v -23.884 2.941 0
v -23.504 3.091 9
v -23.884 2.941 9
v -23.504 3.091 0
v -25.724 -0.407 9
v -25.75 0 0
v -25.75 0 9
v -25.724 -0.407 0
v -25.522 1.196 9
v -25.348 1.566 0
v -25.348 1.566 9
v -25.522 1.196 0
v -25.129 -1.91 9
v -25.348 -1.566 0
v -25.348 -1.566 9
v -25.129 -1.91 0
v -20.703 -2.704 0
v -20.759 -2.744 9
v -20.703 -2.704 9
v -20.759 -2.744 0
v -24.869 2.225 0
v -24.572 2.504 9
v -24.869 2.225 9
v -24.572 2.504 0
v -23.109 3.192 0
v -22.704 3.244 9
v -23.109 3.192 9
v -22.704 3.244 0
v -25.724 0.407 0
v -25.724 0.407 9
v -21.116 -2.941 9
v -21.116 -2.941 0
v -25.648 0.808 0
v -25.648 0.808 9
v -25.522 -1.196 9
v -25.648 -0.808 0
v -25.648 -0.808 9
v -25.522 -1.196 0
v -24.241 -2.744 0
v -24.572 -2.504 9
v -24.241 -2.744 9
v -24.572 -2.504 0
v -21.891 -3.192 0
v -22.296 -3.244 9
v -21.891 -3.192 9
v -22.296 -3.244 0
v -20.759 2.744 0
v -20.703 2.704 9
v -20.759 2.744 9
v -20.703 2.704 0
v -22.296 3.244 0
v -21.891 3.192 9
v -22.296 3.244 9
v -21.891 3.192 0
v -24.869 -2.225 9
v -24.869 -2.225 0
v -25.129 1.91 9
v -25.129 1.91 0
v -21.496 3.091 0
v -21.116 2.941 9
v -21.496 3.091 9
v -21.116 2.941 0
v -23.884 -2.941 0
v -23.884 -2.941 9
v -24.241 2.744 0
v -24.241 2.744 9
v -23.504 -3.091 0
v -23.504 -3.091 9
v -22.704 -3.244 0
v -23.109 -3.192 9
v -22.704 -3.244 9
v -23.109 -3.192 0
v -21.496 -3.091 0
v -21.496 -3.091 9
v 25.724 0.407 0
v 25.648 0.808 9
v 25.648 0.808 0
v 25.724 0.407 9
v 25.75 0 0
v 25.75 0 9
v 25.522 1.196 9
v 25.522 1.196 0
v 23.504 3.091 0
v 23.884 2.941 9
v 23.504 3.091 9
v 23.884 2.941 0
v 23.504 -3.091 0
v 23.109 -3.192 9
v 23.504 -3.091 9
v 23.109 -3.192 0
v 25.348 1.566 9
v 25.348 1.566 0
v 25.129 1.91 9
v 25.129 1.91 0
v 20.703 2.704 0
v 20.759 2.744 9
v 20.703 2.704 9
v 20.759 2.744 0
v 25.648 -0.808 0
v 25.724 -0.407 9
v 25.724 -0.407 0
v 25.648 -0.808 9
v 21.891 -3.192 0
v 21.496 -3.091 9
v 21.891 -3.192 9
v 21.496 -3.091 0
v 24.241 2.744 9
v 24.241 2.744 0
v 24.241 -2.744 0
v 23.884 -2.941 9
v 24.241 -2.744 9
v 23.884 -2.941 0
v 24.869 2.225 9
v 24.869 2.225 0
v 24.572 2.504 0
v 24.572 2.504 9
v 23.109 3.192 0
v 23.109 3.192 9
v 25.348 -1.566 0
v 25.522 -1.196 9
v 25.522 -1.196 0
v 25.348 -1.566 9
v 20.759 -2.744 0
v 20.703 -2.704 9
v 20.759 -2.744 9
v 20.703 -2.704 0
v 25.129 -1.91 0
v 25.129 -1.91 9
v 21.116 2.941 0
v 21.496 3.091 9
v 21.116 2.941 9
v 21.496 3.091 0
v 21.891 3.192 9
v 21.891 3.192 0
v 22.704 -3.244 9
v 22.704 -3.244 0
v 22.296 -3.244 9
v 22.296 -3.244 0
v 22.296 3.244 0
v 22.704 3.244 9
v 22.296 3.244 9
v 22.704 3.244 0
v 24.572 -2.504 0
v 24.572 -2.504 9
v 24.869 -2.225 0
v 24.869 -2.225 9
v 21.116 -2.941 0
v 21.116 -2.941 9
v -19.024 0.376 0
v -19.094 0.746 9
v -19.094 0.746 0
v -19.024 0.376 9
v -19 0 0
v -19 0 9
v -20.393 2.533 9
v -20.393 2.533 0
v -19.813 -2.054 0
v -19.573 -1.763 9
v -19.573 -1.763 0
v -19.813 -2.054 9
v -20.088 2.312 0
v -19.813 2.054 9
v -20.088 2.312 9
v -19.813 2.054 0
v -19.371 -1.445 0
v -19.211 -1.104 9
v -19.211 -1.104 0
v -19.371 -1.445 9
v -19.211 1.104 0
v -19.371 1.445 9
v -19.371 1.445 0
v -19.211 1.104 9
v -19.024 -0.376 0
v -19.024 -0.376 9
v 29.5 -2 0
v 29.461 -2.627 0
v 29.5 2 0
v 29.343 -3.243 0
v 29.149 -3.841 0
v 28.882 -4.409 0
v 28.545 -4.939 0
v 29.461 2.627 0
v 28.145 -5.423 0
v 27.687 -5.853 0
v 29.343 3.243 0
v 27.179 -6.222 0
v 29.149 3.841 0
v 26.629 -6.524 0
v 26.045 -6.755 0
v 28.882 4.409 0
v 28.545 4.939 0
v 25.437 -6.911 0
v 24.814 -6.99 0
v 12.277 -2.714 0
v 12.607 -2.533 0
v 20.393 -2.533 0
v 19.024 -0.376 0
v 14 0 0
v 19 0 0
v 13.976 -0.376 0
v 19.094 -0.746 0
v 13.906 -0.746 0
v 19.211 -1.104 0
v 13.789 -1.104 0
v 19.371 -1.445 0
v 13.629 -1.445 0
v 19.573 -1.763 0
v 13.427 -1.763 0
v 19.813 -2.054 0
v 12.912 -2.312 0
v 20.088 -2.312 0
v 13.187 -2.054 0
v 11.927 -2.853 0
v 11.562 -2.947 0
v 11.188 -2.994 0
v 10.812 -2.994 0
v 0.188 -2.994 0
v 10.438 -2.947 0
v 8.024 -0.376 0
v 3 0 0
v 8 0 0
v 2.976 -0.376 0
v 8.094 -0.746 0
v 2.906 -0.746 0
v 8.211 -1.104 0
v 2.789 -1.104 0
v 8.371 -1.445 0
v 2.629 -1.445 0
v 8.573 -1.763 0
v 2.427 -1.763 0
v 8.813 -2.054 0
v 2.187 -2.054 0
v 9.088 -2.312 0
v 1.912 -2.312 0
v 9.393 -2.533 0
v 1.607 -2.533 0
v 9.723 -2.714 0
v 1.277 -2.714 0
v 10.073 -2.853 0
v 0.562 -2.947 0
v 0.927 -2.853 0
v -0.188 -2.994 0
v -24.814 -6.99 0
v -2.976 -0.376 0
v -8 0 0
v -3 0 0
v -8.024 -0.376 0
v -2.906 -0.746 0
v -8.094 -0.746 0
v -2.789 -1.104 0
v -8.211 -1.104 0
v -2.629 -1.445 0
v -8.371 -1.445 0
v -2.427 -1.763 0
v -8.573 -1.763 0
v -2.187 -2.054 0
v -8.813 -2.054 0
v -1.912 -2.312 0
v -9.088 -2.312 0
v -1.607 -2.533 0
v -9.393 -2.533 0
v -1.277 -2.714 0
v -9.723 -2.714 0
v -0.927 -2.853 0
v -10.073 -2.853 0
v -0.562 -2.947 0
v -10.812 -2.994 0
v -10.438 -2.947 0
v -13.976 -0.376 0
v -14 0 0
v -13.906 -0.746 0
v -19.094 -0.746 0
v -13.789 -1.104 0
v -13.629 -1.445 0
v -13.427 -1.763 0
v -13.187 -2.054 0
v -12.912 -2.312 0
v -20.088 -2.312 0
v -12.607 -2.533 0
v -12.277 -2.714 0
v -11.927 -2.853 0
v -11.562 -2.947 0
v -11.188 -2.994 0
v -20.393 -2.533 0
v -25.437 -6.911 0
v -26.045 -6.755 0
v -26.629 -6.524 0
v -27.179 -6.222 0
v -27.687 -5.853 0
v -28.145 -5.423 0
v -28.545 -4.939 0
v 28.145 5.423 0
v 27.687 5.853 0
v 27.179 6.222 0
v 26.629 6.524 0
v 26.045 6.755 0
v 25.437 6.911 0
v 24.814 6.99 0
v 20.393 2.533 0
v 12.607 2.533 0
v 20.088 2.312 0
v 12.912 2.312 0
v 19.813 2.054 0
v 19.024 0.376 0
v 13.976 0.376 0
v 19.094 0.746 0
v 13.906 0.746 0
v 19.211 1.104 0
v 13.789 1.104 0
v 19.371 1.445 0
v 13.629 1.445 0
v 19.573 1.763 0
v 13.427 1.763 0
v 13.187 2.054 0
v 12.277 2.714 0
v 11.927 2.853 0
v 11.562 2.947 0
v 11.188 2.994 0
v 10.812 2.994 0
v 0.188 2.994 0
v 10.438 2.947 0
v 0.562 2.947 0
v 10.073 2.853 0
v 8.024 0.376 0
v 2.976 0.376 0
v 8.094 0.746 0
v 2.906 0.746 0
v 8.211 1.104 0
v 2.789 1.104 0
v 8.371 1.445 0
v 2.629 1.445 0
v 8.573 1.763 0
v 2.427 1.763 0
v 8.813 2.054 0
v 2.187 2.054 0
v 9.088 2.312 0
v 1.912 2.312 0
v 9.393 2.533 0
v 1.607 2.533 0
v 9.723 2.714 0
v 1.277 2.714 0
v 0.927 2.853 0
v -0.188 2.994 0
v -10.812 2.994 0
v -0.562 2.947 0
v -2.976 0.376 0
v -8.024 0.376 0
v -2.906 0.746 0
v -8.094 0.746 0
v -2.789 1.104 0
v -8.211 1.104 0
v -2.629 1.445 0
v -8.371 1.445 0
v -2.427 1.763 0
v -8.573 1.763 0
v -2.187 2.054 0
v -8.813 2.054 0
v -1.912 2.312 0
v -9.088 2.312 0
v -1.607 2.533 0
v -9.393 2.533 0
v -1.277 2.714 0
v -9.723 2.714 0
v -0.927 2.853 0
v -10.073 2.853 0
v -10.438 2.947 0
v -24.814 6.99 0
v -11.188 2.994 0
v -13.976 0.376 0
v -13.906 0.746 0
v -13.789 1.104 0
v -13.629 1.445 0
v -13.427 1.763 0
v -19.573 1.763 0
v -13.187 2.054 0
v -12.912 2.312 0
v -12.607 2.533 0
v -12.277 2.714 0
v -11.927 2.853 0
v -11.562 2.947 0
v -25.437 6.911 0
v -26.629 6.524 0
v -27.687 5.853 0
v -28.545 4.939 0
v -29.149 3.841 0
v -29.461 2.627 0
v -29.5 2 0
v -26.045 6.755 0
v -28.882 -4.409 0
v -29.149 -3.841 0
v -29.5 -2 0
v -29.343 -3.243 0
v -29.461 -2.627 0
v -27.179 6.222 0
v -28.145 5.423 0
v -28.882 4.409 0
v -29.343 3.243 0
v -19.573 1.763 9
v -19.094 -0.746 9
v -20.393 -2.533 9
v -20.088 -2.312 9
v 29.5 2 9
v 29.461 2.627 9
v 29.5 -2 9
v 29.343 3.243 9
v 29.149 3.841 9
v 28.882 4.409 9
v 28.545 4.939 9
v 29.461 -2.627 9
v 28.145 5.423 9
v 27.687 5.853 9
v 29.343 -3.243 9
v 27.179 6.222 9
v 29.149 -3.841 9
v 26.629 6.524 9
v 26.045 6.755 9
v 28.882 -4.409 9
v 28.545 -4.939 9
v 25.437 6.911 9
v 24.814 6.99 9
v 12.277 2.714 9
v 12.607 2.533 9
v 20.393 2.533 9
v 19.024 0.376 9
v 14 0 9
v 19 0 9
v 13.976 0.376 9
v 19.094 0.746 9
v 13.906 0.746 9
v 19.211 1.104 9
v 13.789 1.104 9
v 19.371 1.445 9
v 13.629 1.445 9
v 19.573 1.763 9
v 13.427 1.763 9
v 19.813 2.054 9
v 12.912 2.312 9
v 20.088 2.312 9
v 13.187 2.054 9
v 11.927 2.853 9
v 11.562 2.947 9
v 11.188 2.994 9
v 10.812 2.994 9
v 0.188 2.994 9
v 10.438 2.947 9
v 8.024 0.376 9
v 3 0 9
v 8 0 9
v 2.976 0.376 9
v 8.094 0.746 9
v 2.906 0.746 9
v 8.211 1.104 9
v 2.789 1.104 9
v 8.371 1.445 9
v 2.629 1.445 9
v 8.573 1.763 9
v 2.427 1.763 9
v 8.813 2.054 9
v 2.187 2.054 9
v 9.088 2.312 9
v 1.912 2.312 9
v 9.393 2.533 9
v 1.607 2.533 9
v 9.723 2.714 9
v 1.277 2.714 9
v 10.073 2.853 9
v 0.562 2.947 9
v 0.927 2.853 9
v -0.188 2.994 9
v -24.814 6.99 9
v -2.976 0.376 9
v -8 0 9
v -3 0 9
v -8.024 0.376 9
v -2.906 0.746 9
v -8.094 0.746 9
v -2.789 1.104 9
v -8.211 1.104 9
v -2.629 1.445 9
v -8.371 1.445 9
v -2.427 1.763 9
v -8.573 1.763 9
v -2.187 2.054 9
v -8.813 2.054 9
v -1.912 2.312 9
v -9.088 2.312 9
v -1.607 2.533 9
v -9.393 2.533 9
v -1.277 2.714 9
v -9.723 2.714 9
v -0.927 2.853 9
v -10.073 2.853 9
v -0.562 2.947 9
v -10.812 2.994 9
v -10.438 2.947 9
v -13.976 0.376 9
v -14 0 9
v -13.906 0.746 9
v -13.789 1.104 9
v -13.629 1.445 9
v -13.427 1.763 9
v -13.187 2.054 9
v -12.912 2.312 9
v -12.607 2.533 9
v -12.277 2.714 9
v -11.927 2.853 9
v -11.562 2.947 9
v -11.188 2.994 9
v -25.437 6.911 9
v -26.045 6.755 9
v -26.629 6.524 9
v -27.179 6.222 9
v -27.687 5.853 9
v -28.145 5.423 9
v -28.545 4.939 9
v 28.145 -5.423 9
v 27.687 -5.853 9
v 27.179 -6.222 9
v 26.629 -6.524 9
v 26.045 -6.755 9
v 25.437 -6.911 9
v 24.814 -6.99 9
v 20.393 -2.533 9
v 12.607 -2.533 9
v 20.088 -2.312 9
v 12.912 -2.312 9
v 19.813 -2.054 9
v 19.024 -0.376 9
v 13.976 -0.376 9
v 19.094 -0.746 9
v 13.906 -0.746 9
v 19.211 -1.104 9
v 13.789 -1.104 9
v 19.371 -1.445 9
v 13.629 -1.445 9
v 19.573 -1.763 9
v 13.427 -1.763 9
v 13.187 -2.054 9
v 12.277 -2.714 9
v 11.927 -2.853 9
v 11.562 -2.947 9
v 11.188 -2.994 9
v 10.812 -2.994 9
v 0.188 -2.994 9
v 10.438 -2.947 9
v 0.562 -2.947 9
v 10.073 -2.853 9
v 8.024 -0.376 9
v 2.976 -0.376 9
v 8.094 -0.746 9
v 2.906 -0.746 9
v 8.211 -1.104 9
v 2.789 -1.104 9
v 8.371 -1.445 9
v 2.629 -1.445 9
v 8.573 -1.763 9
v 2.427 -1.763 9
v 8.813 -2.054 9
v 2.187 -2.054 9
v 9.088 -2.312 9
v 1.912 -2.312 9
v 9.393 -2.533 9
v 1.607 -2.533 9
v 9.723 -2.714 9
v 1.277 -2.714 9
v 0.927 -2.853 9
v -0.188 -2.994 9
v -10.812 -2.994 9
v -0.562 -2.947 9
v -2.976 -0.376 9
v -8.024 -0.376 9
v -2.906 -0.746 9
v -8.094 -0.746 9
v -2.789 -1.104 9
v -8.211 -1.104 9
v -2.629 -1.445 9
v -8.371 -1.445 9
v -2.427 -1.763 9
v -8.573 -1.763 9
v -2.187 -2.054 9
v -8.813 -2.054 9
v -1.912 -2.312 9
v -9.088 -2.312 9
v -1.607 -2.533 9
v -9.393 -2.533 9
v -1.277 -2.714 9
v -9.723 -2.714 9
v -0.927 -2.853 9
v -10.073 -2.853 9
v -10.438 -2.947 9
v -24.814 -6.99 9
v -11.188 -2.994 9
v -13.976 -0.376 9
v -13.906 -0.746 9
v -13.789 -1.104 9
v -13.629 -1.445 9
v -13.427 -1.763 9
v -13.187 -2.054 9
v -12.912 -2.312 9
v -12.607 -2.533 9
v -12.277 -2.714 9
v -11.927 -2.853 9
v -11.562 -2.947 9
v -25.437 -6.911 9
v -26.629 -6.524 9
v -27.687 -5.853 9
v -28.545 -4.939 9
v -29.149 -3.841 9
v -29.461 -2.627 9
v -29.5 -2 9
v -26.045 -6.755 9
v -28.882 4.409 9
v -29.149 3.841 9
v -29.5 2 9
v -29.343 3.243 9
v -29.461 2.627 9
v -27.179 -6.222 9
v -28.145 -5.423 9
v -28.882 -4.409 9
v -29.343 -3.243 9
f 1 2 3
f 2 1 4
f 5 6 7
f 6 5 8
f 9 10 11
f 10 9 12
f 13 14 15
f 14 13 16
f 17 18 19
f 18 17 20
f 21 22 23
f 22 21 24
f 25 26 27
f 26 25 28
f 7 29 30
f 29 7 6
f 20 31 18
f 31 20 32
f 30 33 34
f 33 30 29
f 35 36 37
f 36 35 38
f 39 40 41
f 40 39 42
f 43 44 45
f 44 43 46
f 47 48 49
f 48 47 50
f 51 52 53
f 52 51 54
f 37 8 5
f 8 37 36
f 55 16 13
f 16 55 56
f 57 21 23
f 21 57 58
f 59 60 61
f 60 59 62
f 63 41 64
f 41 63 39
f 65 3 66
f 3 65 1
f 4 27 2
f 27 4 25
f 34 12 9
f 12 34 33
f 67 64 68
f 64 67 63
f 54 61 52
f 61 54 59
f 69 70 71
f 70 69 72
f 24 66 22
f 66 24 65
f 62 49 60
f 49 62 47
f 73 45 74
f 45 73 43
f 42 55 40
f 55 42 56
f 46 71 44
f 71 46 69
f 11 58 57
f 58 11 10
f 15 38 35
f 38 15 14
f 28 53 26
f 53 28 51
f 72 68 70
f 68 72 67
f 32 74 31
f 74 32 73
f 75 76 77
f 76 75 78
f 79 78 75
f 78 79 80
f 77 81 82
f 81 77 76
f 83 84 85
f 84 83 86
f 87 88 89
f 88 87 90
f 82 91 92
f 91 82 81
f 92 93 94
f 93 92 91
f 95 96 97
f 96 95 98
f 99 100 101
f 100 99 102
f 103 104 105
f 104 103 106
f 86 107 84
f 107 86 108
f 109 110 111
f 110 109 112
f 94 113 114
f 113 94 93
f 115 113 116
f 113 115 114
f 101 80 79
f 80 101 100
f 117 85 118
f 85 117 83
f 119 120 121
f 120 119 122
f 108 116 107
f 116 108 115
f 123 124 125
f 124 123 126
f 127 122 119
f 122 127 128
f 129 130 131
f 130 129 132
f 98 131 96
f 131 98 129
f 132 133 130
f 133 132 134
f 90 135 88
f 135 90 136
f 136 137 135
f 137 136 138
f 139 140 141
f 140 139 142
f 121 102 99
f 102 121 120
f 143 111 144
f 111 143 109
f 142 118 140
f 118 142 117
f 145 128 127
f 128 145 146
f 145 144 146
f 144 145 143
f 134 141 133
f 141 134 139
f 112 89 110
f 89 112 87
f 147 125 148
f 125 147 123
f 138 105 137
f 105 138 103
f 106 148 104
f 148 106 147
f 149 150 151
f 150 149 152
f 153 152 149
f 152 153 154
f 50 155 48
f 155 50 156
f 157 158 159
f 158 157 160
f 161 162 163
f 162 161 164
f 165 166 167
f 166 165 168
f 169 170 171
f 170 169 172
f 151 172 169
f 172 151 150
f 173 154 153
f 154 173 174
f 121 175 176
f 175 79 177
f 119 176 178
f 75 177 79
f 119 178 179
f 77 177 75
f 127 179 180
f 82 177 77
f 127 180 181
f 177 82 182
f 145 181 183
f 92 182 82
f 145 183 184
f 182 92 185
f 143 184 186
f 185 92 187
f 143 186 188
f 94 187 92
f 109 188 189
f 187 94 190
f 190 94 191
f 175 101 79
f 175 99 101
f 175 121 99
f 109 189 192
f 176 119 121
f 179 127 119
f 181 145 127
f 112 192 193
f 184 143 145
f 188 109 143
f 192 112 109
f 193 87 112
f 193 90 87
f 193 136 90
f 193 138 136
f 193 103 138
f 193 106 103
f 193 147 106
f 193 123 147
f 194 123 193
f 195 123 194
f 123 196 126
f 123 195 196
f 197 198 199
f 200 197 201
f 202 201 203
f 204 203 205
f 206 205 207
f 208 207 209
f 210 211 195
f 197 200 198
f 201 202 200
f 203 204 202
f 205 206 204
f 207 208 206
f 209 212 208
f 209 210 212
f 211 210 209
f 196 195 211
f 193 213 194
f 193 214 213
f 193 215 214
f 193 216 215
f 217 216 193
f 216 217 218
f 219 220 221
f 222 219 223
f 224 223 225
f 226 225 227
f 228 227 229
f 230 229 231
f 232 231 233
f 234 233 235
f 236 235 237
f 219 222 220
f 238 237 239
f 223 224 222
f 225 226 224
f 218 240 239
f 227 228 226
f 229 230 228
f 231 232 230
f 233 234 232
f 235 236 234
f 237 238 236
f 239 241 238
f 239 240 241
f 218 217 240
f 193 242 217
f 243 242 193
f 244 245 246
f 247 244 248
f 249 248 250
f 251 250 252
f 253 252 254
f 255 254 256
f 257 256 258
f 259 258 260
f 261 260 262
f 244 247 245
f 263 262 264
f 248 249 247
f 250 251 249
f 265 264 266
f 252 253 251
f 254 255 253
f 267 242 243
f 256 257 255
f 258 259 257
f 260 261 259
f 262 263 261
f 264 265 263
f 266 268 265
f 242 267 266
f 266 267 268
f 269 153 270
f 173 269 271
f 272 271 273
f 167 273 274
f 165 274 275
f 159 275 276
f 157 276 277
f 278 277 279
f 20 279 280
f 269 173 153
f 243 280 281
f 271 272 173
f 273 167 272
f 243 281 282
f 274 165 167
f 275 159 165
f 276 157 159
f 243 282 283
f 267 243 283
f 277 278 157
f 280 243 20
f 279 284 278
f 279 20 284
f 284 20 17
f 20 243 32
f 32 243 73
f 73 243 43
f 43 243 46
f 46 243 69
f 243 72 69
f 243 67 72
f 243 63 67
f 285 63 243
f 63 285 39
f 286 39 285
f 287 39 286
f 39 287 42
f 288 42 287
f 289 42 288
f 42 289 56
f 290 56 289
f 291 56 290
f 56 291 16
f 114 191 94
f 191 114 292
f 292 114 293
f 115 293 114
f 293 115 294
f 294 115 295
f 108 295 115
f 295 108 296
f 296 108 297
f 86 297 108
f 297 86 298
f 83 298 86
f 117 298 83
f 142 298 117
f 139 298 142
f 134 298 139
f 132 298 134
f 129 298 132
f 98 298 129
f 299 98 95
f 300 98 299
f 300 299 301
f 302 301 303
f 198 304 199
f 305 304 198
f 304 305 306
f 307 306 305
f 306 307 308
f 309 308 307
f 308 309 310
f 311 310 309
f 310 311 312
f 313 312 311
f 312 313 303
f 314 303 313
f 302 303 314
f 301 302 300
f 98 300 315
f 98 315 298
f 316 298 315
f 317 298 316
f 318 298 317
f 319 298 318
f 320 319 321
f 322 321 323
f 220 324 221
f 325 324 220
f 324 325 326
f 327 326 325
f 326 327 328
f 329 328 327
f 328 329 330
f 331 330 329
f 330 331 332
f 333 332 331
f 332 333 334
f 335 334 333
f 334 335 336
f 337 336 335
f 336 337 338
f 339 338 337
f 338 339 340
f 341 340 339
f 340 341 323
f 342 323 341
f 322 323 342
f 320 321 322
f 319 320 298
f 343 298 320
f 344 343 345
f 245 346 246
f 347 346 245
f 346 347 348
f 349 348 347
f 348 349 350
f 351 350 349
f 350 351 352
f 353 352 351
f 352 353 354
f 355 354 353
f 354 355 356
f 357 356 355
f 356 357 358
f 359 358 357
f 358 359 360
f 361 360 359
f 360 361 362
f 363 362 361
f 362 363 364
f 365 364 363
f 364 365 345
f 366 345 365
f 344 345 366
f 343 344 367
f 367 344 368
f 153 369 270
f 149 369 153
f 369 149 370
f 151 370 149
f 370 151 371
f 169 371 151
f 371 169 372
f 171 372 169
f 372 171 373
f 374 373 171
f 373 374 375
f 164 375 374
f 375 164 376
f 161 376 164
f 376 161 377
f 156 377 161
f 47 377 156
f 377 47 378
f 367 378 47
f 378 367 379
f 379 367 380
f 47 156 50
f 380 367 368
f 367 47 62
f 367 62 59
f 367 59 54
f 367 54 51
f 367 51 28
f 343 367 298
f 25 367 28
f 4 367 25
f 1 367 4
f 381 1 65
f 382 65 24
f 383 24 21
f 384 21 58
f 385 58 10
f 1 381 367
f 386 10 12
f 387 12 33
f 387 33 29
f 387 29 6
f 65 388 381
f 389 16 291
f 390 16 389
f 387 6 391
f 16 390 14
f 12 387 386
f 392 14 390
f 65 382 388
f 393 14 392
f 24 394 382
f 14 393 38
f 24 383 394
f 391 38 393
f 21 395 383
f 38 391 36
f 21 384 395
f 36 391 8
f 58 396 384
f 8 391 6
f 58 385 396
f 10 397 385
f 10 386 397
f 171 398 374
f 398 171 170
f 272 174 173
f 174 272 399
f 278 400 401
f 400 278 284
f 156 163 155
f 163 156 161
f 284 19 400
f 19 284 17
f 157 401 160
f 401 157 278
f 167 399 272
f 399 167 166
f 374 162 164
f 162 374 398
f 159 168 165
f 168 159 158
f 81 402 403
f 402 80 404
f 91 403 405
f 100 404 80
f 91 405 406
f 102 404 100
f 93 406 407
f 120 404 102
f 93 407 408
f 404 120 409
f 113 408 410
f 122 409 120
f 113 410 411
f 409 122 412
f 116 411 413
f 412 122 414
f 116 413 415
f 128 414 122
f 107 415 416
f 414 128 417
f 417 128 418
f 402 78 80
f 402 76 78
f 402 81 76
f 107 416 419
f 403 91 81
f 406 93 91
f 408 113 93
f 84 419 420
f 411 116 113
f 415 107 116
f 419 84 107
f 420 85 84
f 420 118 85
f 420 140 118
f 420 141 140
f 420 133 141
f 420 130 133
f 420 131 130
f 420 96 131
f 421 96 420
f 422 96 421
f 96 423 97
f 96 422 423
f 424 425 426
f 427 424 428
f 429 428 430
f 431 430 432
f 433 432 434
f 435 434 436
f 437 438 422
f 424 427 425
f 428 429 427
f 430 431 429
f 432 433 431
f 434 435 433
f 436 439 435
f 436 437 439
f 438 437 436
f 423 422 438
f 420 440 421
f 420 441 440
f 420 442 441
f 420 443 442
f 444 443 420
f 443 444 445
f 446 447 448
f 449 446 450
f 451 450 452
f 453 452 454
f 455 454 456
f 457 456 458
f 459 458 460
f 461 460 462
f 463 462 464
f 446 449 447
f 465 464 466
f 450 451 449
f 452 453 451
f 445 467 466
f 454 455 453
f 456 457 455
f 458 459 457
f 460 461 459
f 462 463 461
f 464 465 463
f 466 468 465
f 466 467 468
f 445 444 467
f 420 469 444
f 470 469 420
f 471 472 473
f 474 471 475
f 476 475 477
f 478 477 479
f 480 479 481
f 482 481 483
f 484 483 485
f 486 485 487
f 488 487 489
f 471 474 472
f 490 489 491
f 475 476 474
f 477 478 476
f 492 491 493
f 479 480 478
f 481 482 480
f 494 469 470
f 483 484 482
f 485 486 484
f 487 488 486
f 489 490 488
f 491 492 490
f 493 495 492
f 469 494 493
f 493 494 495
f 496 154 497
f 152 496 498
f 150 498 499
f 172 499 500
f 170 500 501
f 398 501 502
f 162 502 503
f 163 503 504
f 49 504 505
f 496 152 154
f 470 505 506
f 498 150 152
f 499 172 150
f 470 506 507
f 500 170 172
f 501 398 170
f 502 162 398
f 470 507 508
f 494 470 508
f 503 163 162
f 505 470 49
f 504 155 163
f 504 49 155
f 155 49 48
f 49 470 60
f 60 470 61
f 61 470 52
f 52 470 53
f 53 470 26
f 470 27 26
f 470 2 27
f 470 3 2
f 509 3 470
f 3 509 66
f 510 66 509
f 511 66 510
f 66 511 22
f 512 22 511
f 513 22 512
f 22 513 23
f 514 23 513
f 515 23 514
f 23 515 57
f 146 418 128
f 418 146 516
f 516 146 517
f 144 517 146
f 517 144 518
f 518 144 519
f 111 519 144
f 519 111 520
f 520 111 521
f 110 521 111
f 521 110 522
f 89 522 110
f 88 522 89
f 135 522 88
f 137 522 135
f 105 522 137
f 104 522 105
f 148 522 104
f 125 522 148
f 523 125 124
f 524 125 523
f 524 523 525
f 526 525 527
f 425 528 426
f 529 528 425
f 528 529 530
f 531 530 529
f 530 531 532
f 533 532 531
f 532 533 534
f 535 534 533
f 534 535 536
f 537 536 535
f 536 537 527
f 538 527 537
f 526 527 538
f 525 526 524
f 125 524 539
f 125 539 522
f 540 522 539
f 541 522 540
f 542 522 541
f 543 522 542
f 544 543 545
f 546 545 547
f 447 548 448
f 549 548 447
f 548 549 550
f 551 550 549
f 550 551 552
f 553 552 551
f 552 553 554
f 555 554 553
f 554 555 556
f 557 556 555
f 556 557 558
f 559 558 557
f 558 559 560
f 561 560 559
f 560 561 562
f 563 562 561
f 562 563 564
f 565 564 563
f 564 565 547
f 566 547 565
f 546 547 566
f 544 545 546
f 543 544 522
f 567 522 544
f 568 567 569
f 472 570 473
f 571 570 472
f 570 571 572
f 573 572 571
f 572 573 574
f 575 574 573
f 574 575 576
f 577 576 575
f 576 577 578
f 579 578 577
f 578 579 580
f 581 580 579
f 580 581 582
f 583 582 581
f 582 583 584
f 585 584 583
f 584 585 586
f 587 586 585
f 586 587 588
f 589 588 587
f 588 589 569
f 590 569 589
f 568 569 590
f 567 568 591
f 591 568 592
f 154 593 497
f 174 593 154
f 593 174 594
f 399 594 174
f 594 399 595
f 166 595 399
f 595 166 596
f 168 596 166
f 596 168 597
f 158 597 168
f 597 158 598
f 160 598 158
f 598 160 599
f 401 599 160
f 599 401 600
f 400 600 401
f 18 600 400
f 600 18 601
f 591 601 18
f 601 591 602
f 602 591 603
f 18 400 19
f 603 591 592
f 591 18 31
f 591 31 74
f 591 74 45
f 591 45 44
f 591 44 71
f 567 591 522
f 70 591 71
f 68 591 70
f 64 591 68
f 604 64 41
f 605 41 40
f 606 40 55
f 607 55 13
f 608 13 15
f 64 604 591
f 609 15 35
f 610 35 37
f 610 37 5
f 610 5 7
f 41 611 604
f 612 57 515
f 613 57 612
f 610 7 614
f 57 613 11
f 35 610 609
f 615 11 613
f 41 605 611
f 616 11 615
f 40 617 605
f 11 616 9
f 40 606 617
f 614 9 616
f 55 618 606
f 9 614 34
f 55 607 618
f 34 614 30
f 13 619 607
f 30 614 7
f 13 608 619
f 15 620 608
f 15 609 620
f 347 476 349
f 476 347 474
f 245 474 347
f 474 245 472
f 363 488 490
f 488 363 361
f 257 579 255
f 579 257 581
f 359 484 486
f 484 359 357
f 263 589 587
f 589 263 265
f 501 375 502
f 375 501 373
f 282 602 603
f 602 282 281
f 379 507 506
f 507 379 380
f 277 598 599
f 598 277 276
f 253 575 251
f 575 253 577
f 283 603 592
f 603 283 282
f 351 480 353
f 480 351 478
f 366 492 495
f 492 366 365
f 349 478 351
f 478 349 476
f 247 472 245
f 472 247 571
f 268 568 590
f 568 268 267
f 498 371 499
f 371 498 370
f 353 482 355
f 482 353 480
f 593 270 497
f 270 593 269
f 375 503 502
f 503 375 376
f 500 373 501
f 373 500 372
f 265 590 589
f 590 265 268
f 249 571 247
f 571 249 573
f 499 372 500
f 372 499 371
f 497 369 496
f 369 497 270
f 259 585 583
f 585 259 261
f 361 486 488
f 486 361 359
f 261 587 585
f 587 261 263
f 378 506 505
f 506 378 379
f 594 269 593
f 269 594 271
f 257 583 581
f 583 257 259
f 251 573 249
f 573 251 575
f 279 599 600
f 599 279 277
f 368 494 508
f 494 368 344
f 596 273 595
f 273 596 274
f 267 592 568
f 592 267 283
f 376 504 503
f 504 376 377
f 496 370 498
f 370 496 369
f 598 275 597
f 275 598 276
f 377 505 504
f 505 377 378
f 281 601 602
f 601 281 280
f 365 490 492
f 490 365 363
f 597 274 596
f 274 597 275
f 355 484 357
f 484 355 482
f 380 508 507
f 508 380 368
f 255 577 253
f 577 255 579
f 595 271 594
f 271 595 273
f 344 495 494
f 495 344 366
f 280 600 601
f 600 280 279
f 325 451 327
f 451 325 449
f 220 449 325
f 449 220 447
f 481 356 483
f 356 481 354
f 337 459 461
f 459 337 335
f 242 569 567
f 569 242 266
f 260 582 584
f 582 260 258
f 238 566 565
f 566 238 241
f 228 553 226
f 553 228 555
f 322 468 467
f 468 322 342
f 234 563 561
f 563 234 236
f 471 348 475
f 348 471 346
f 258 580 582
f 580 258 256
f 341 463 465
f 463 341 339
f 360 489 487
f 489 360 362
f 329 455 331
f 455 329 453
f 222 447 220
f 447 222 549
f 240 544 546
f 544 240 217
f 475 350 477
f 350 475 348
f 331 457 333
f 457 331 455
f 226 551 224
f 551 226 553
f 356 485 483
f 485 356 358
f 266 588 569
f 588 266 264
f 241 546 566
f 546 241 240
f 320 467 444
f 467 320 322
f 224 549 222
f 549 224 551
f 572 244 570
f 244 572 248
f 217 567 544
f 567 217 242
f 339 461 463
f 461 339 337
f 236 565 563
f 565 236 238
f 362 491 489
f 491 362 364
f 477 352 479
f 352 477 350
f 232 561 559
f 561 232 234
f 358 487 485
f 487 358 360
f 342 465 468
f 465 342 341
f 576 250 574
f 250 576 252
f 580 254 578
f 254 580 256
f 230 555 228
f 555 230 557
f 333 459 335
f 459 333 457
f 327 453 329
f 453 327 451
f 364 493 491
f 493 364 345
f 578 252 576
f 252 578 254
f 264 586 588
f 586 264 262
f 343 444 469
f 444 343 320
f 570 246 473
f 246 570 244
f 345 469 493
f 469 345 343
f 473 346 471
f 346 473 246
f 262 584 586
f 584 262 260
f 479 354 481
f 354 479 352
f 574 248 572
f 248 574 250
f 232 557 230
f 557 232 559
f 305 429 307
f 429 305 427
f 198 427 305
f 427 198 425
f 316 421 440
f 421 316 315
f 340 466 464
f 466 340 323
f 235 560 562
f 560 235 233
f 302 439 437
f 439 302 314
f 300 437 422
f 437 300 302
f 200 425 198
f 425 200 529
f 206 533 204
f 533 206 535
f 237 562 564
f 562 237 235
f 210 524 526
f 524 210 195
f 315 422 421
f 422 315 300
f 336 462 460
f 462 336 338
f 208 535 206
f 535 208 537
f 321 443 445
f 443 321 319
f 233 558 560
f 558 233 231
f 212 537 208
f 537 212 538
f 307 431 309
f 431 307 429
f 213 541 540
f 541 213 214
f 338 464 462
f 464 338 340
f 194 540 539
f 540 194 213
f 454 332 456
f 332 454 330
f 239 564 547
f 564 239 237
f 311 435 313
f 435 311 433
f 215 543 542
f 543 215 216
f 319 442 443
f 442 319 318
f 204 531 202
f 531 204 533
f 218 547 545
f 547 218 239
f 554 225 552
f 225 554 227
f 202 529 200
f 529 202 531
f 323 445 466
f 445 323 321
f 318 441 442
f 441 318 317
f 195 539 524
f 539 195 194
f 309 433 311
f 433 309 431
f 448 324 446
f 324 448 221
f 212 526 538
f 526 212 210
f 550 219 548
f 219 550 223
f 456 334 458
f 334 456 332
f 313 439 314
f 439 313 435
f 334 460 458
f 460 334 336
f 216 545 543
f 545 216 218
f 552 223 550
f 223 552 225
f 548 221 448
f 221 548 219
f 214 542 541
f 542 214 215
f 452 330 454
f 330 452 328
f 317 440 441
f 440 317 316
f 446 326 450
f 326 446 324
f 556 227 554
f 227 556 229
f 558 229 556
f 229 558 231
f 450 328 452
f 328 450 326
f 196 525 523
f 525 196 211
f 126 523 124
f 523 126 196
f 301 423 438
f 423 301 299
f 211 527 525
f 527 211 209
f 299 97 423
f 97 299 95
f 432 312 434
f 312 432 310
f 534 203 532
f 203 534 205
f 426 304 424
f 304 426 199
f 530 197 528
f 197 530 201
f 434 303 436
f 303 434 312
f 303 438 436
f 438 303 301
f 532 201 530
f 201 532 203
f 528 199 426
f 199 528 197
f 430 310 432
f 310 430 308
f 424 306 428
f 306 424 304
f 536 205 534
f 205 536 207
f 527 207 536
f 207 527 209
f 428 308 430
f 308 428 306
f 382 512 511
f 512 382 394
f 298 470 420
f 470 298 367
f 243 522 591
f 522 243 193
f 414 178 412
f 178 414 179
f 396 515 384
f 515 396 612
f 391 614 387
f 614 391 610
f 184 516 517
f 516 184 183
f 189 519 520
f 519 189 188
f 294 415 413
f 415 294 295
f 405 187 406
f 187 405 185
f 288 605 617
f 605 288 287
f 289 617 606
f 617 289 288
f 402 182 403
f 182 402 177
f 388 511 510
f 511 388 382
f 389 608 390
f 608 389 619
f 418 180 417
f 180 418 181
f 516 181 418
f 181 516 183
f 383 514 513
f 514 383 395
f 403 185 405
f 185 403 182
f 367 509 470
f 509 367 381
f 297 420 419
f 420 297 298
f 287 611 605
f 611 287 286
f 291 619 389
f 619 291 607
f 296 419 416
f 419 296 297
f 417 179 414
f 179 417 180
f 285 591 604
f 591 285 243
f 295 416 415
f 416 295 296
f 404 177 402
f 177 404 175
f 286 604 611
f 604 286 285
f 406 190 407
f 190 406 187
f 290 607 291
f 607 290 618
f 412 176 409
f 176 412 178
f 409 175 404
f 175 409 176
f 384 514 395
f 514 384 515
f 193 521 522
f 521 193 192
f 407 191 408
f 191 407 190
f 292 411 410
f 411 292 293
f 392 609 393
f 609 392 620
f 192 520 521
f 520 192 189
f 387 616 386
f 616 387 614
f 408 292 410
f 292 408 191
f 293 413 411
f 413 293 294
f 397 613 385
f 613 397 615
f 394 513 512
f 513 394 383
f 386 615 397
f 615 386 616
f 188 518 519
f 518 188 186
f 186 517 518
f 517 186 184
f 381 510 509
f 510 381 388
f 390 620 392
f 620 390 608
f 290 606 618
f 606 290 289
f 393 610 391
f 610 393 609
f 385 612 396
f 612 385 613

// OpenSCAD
$fn = 50;

difference() {
	union() {
		hull() {
			translate(v = [-24.5, 2.0, 0]) {
				cylinder(h = 9, r = 5);
			}
			translate(v = [24.5, 2.0, 0]) {
				cylinder(h = 9, r = 5);
			}
			translate(v = [-24.5, -2.0, 0]) {
				cylinder(h = 9, r = 5);
			}
			translate(v = [24.5, -2.0, 0]) {
				cylinder(h = 9, r = 5);
			}
		}
	}
	union() {
		translate(v = [-22.5, 0.0, -100.0]) {
			cylinder(h = 200, r = 3.25);
		}
		translate(v = [22.5, 0.0, -100.0]) {
			cylinder(h = 200, r = 3.25);
		}
		translate(v = [-22.5, 0.0, -100.0]) {
			cylinder(h = 200, r = 1.8);
		}
		translate(v = [22.5, 0.0, -100.0]) {
			cylinder(h = 200, r = 1.8);
		}
		translate(v = [-22.0, 0, 0.0]) {
			cylinder(h = 9, r = 3.0);
		}
		translate(v = [-11.0, 0, 0.0]) {
			cylinder(h = 9, r = 3.0);
		}
		cylinder(h = 9, r = 3.0);
		translate(v = [11.0, 0, 0.0]) {
			cylinder(h = 9, r = 3.0);
		}
		translate(v = [22.0, 0, 0.0]) {
			cylinder(h = 9, r = 3.0);
		}
	}
}
